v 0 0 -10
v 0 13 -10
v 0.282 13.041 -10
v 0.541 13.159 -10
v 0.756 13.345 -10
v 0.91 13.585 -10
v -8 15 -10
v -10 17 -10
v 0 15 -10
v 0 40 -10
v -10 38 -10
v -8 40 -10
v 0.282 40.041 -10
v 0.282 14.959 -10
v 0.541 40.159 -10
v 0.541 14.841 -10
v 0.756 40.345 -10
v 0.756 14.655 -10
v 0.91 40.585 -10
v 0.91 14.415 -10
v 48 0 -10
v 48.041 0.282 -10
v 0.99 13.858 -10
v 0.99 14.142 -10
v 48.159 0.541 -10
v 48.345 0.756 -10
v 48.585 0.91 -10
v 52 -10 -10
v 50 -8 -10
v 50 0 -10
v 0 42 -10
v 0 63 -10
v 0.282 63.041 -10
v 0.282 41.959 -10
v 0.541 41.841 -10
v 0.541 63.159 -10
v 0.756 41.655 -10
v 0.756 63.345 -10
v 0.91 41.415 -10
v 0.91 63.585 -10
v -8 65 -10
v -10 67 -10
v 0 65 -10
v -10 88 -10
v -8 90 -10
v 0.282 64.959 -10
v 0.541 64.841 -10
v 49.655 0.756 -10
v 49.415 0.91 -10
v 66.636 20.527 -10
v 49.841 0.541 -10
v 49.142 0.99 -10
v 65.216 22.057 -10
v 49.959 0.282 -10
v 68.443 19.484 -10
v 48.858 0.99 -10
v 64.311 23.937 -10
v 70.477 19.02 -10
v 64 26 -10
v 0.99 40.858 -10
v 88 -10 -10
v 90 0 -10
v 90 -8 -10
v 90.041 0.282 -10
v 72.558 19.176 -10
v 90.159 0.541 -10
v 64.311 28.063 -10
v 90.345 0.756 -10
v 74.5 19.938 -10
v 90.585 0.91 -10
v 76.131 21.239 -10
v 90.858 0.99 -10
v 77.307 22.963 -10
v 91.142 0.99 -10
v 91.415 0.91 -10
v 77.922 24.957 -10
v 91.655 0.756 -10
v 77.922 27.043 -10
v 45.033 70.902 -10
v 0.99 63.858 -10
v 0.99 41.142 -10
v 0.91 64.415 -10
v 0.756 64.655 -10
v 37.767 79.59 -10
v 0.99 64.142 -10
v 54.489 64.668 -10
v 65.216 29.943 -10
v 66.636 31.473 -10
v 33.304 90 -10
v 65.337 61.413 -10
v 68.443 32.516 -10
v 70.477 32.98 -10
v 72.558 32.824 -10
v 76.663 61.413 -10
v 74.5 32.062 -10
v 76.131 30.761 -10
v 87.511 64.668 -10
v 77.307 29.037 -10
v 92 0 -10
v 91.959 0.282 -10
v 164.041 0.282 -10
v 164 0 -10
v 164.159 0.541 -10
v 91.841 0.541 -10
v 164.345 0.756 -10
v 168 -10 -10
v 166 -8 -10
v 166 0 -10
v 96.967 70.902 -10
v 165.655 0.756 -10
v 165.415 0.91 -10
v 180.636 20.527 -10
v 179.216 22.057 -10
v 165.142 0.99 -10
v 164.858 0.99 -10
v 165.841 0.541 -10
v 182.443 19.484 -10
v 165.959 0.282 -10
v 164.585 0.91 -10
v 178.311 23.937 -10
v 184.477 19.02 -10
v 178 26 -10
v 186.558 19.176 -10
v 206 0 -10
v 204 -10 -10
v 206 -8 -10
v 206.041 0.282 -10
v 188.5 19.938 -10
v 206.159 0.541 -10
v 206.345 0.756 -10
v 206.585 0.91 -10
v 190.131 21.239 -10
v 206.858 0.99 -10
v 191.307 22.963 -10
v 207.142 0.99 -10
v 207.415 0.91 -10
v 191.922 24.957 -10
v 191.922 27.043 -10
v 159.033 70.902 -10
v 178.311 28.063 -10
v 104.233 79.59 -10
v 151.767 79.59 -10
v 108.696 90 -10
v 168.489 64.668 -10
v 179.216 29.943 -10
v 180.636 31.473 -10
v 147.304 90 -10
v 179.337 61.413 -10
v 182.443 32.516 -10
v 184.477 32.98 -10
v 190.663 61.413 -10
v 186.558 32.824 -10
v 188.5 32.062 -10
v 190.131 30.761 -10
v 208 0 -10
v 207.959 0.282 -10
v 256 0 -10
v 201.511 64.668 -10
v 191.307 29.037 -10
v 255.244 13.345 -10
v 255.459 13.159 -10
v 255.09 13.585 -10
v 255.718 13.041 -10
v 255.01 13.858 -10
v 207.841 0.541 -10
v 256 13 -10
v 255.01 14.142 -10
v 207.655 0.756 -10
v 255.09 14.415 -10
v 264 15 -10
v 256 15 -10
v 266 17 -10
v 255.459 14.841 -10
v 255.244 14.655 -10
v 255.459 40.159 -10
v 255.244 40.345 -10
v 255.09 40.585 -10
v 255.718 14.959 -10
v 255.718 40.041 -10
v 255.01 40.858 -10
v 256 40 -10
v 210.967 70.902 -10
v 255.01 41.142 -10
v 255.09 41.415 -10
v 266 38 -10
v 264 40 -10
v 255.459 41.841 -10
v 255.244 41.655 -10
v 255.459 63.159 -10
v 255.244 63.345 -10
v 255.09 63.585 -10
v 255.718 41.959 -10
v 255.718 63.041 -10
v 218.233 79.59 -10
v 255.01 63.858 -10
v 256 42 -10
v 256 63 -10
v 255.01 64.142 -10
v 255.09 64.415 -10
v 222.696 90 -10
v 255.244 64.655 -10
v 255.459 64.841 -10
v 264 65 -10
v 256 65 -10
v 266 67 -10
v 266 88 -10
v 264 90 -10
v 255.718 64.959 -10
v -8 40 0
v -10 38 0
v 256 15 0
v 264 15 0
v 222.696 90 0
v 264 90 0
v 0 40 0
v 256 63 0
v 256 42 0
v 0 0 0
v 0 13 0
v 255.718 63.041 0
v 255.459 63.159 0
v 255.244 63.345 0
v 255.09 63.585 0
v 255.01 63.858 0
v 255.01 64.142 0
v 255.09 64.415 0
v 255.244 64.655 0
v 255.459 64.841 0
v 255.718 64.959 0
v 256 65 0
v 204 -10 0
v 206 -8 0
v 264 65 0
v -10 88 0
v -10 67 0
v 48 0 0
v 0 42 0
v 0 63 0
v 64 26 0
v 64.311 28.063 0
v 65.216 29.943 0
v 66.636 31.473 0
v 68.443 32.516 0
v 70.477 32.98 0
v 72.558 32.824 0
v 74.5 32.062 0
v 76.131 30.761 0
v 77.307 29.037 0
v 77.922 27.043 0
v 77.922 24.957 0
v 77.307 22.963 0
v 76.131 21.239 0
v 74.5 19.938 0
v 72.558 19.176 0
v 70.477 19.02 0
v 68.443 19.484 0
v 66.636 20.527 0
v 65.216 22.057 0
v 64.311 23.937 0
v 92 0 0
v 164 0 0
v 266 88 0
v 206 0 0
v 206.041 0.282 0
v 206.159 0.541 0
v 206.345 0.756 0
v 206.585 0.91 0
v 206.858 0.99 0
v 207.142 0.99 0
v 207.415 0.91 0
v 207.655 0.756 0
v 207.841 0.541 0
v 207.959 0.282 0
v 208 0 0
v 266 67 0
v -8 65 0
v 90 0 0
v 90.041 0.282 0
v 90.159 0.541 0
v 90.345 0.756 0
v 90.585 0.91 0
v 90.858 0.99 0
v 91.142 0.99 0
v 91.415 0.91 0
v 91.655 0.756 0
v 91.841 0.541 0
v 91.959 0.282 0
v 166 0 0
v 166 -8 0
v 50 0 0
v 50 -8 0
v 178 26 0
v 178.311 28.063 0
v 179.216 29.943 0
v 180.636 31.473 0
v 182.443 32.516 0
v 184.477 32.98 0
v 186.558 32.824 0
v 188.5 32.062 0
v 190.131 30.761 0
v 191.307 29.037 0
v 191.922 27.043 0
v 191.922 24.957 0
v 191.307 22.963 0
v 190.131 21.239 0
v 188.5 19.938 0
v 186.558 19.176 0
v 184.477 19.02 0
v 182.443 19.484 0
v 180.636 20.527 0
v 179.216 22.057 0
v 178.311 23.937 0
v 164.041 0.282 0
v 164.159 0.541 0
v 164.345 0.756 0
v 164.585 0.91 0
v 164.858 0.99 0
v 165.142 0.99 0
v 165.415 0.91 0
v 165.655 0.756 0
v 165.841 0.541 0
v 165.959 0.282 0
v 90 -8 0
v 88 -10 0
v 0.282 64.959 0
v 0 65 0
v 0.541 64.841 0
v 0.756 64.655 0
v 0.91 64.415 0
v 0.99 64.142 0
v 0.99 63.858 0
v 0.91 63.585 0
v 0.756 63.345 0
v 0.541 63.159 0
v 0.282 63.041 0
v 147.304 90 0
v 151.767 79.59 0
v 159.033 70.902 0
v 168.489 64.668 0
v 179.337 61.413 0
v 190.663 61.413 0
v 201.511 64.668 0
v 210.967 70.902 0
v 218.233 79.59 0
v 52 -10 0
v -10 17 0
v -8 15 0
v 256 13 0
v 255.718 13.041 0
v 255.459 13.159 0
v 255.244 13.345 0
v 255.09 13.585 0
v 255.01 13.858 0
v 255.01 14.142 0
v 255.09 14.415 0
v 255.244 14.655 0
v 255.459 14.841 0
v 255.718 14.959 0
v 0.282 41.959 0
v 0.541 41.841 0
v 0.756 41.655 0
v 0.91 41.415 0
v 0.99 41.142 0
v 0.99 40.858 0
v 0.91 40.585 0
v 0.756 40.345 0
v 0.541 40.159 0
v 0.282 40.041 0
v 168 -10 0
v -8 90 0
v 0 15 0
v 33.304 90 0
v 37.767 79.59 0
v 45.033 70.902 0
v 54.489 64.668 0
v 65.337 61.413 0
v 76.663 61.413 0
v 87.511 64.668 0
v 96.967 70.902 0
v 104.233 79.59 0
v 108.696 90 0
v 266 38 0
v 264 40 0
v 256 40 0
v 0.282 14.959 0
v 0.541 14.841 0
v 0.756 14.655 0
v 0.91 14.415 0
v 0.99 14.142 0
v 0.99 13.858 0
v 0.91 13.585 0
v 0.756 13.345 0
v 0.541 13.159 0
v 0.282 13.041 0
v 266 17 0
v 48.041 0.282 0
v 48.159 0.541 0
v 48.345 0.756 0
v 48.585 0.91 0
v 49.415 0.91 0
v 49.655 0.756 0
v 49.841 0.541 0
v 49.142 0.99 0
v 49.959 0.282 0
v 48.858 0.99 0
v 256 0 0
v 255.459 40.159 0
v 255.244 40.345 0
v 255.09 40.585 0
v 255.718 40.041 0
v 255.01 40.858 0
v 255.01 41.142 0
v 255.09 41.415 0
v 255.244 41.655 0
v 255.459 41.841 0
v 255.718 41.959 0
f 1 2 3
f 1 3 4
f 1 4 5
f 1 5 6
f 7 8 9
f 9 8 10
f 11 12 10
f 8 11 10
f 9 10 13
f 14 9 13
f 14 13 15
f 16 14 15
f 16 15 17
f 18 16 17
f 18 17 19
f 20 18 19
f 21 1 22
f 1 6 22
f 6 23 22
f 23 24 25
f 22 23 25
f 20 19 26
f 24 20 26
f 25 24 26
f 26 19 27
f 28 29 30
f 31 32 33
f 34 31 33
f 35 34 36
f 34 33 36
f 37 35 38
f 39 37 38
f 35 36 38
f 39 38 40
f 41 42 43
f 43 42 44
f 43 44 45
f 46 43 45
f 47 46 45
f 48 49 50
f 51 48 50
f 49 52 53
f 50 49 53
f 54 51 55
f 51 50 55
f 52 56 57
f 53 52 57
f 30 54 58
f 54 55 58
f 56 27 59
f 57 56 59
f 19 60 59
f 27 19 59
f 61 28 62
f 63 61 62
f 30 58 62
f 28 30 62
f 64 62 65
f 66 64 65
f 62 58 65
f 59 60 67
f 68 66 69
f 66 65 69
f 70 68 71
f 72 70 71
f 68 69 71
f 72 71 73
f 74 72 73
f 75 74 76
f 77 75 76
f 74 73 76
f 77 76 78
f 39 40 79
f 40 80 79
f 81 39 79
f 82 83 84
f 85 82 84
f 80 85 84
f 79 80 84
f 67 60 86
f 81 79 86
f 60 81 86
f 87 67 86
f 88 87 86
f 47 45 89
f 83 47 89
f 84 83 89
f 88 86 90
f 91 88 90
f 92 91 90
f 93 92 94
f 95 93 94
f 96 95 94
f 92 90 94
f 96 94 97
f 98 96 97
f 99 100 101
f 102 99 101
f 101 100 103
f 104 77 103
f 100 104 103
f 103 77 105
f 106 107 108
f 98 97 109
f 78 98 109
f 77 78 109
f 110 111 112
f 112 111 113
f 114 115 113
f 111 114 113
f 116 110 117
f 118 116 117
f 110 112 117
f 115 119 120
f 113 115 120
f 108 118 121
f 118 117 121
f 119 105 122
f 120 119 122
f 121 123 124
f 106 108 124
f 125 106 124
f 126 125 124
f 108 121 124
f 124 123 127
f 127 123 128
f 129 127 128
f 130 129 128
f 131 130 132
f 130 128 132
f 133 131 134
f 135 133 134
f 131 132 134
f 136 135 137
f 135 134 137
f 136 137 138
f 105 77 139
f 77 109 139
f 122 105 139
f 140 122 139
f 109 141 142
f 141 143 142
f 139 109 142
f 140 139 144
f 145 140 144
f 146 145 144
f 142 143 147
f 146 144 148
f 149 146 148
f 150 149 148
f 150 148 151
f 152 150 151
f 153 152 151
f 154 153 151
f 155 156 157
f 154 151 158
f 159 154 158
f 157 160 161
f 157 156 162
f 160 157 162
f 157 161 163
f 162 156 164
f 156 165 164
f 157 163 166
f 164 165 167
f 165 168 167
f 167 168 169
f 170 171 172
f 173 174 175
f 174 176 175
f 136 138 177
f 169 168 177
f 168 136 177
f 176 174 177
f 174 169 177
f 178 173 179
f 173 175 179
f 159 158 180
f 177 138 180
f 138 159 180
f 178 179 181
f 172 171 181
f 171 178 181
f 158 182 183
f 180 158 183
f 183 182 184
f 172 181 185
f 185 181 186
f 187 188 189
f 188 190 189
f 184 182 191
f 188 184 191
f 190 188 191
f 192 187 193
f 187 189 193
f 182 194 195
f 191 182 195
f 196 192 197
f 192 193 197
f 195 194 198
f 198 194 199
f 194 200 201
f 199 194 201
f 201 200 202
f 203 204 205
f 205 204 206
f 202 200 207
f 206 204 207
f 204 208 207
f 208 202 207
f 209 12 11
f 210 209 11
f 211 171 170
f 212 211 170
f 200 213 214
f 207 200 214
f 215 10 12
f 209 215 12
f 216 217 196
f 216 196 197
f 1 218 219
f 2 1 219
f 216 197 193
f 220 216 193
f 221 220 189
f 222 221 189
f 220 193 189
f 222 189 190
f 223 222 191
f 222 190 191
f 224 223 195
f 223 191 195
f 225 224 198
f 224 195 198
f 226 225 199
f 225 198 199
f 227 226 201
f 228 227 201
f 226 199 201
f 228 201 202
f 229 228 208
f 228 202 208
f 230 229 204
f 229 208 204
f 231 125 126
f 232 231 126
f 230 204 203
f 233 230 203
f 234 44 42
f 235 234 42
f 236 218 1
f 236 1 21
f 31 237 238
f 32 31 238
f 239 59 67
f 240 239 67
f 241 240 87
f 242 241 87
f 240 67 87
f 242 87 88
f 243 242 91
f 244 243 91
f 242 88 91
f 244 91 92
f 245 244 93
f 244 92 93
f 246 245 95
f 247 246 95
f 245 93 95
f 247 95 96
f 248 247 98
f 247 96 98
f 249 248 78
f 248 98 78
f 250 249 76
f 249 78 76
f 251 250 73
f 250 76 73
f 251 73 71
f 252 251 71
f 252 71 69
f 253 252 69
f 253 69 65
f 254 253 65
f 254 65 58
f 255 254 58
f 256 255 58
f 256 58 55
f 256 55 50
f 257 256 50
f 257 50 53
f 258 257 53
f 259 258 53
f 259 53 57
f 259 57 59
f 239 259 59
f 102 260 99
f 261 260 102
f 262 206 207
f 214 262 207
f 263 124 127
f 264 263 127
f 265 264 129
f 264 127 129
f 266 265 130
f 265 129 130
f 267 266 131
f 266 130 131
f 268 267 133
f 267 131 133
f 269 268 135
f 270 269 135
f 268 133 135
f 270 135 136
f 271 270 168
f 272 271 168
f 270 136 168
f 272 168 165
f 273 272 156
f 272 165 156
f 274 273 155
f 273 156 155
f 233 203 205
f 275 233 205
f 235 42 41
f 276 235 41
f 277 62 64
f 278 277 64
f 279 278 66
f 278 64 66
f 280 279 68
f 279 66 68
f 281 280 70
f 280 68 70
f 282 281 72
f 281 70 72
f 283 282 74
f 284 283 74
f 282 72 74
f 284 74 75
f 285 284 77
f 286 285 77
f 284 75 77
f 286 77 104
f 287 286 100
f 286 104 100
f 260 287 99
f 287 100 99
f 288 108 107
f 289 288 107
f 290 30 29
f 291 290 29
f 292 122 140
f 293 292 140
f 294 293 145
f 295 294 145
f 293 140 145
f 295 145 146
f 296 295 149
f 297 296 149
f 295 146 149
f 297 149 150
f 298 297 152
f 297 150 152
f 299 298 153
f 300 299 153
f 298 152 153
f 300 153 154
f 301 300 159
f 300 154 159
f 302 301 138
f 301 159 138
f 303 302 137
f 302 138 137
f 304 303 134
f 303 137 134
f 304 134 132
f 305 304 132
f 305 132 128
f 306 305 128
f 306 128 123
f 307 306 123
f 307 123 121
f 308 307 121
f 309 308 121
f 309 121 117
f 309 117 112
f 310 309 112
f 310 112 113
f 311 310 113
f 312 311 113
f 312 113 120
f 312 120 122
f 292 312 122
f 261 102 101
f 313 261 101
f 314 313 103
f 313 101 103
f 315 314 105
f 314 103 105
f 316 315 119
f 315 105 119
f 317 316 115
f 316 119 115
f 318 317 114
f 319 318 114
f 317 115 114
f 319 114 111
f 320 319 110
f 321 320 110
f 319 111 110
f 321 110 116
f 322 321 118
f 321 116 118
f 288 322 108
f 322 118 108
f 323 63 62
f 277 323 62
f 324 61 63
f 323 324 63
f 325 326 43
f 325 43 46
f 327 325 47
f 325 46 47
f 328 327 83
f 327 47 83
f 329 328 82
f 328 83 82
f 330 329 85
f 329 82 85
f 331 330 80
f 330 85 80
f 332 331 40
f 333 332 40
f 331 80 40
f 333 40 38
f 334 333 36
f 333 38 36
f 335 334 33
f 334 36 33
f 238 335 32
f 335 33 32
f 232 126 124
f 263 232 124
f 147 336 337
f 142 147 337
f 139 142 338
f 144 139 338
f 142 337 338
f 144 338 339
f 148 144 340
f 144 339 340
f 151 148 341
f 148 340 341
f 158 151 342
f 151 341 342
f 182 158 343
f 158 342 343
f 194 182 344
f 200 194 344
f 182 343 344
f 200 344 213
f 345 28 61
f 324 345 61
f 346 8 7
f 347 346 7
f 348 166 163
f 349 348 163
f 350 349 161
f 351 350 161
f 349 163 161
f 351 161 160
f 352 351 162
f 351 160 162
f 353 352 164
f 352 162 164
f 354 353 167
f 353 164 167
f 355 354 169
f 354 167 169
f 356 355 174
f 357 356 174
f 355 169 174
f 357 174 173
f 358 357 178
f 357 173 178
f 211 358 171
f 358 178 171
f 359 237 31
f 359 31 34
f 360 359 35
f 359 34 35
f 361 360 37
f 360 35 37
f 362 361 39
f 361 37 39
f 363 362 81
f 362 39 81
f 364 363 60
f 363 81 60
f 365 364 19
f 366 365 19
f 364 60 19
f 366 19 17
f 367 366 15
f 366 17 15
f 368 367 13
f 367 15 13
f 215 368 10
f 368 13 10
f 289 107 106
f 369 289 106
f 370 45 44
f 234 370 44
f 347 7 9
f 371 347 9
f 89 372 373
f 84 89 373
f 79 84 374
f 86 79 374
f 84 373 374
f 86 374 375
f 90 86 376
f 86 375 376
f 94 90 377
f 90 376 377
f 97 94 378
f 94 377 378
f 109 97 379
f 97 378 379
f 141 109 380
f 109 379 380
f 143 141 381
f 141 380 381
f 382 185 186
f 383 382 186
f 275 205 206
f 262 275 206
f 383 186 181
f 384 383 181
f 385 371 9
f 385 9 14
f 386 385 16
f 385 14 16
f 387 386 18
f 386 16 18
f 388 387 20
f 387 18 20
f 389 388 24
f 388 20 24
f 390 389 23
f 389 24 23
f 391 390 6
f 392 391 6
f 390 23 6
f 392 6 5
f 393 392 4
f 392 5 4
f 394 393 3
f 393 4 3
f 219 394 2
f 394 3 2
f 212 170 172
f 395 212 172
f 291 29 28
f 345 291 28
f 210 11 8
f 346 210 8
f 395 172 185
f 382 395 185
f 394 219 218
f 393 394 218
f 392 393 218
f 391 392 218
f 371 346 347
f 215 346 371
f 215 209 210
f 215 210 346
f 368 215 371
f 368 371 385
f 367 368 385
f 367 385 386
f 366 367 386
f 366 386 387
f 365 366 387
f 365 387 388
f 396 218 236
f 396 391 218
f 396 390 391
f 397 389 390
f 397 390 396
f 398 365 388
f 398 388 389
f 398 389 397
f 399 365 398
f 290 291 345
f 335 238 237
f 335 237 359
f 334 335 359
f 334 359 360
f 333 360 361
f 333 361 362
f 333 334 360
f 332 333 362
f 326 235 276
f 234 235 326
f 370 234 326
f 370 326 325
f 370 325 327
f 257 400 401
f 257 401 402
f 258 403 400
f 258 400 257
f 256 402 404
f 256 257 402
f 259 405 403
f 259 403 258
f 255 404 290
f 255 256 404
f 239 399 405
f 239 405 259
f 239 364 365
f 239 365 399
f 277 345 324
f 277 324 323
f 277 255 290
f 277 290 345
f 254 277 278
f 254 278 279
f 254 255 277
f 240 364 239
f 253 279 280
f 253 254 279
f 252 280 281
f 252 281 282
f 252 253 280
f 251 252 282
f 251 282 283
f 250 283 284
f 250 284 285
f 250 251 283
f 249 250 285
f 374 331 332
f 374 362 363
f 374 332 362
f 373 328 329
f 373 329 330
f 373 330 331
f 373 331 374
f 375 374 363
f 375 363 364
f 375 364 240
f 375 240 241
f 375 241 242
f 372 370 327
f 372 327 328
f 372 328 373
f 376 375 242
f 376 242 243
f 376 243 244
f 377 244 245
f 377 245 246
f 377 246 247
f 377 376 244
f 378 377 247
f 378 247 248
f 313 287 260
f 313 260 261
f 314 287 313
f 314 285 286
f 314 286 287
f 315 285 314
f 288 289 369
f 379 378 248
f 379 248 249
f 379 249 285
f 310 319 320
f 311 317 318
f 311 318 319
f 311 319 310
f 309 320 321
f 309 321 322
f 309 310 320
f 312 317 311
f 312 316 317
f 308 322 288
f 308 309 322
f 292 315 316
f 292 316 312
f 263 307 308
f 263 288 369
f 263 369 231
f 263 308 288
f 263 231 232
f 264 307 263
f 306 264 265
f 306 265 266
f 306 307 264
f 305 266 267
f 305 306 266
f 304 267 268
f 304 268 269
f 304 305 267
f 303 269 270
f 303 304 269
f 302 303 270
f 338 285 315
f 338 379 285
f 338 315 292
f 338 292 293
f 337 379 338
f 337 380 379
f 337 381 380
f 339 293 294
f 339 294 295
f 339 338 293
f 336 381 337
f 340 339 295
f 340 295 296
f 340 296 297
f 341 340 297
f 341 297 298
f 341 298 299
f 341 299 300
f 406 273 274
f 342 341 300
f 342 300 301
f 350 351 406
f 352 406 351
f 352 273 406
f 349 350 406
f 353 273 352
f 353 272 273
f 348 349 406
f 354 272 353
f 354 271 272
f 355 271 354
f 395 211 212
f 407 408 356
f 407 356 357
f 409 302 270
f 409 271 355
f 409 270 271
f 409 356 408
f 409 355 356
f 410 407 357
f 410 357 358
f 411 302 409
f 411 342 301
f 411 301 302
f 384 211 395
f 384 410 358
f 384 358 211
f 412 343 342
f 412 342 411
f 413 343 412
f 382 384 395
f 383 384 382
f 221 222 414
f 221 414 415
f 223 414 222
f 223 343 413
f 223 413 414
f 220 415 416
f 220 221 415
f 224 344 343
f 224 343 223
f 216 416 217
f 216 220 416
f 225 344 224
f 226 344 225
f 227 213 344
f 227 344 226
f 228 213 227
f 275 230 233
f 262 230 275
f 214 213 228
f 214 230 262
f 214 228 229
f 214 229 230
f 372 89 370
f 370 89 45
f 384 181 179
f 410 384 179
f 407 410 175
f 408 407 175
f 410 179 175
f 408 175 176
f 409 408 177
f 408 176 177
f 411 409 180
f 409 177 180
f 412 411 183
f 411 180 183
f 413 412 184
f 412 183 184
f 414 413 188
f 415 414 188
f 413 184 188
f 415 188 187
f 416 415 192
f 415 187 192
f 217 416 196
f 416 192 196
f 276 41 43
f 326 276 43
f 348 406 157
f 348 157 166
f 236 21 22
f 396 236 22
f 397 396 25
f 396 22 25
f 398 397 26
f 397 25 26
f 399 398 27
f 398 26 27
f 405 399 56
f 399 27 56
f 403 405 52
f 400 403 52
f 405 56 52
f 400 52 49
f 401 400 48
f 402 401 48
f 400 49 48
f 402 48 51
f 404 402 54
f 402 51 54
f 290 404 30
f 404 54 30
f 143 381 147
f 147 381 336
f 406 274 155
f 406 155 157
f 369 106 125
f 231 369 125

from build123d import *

# Parameters (mm, degrees)
ESQUISSE1_W                               = 256
ESQUISSE1_H                               = 100
T_LE_DE_BASE_PLI_E1_DEPTH                 = 10
ENL_V_MAT_EXTRU_1_DEPTH                   = 10
TROU_POUR_TARAUDAGE_POUR_TROU_TARAUD_M1_D = 14
TAB_START                                 = -10
TAB_AND_SLOT_TAB1_DEPTH                   = 10
TAB_AND_SLOT_TAB2_DEPTH                   = 10
TAB_AND_SLOT_TAB3_DEPTH                   = 10
ESQUISSE17_W                              = 256
ESQUISSE17_H                              = 10
ENL_V_MAT_EXTRU_2_DEPTH                   = 10
DIAM_TRE_DU_PER_AGE_2_0_2_1_D             = 2


# Read off the part's stored shape, not the designer's step: Tab and Slot-Tab1, Tab and Slot-Tab2, Tab and Slot-Tab3
# Sheet-metal steps are written as plain solids
with BuildPart() as part:
    # Esquisse1 → Tôle de base pliée1 (new body)
    with BuildSketch(Plane.XY):
        with Locations((128, 50)):
            Rectangle(ESQUISSE1_W, ESQUISSE1_H)
    extrude(amount=-T_LE_DE_BASE_PLI_E1_DEPTH)

    # Esquisse9 → Enlèv. mat.-Extru.1 (cut)
    with BuildSketch(Plane.XY):
        with BuildLine():
            Line((32, 100), (110, 100))
            ThreePointArc((110, 100), (71, 139), (32, 100))
        make_face()
        with BuildLine():
            ThreePointArc((32, 100), (71, 61), (110, 100))
            Line((110, 100), (32, 100))
        make_face()
        with BuildLine():
            ThreePointArc((224, 100), (185, 139), (146, 100))
            Line((146, 100), (224, 100))
        make_face()
        with BuildLine():
            Line((224, 100), (146, 100))
            ThreePointArc((146, 100), (185, 61), (224, 100))
        make_face()
    extrude(amount=-ENL_V_MAT_EXTRU_1_DEPTH, mode=Mode.SUBTRACT)

    # Trou pour taraudage pour trou taraudé M161 (through all)
    with Locations(Plane.XY):
        with Locations((71, 26), (185, 26)):
            Hole(TROU_POUR_TARAUDAGE_POUR_TROU_TARAUD_M1_D / 2)

    # Tab and Slot-Tab1 outline → Tab and Slot-Tab1 (add)
    with BuildSketch(Plane.XY.offset(TAB_START)):
        Polygon((204, -10), (206, -8), (206, 0), (166, 0), (166, -8), (168, -10), align=None)
        Polygon((90, -8), (90, 0), (50, 0), (50, -8), (52, -10), (88, -10), align=None)
    extrude(amount=TAB_AND_SLOT_TAB1_DEPTH)

    # Tab and Slot-Tab2 outline → Tab and Slot-Tab2 (add)
    with BuildSketch(Plane.XY.offset(TAB_START)):
        Polygon((-10, 17), (-8, 15), (0, 15), (0, 40), (-8, 40), (-10, 38), align=None)
        Polygon((-8, 65), (0, 65), (0, 90), (-8, 90), (-10, 88), (-10, 67), align=None)
    extrude(amount=TAB_AND_SLOT_TAB2_DEPTH)

    # Tab and Slot-Tab3 outline → Tab and Slot-Tab3 (add)
    with BuildSketch(Plane.XY.offset(TAB_START)):
        Polygon((256, 90), (256, 65), (264, 65), (266, 67), (266, 88), (264, 90), align=None)
        Polygon((256, 15), (264, 15), (266, 17), (266, 38), (264, 40), (256, 40), align=None)
    extrude(amount=TAB_AND_SLOT_TAB3_DEPTH)

    # Esquisse17 → Enlèv. mat.-Extru.2 (cut)
    with BuildSketch(Plane.XY):
        with Locations((128, 95)):
            Rectangle(ESQUISSE17_W, ESQUISSE17_H)
    extrude(amount=-ENL_V_MAT_EXTRU_2_DEPTH, mode=Mode.SUBTRACT)

    # Diamètre du perçage Ø2.0 (2)1 (through all)
    with Locations(Plane.XY):
        with Locations((256, 64)):
            diam_tre_du_per_age_2_0_2_1 = Hole(DIAM_TRE_DU_PER_AGE_2_0_2_1_D / 2)

    # Répét. par esquisse1: Diamètre du perçage Ø2.0 (2)1 at 9 more places
    with Locations((-256, 0, 0), (-256, -23, 0), (-256, -50, 0), (-207, -64, 0), (-165, -64, 0), (-91, -64, 0), (-49, -64, 0), (0, -50, 0), (0, -23, 0)):
        add(diam_tre_du_per_age_2_0_2_1, mode=Mode.SUBTRACT)


solid = part.part
